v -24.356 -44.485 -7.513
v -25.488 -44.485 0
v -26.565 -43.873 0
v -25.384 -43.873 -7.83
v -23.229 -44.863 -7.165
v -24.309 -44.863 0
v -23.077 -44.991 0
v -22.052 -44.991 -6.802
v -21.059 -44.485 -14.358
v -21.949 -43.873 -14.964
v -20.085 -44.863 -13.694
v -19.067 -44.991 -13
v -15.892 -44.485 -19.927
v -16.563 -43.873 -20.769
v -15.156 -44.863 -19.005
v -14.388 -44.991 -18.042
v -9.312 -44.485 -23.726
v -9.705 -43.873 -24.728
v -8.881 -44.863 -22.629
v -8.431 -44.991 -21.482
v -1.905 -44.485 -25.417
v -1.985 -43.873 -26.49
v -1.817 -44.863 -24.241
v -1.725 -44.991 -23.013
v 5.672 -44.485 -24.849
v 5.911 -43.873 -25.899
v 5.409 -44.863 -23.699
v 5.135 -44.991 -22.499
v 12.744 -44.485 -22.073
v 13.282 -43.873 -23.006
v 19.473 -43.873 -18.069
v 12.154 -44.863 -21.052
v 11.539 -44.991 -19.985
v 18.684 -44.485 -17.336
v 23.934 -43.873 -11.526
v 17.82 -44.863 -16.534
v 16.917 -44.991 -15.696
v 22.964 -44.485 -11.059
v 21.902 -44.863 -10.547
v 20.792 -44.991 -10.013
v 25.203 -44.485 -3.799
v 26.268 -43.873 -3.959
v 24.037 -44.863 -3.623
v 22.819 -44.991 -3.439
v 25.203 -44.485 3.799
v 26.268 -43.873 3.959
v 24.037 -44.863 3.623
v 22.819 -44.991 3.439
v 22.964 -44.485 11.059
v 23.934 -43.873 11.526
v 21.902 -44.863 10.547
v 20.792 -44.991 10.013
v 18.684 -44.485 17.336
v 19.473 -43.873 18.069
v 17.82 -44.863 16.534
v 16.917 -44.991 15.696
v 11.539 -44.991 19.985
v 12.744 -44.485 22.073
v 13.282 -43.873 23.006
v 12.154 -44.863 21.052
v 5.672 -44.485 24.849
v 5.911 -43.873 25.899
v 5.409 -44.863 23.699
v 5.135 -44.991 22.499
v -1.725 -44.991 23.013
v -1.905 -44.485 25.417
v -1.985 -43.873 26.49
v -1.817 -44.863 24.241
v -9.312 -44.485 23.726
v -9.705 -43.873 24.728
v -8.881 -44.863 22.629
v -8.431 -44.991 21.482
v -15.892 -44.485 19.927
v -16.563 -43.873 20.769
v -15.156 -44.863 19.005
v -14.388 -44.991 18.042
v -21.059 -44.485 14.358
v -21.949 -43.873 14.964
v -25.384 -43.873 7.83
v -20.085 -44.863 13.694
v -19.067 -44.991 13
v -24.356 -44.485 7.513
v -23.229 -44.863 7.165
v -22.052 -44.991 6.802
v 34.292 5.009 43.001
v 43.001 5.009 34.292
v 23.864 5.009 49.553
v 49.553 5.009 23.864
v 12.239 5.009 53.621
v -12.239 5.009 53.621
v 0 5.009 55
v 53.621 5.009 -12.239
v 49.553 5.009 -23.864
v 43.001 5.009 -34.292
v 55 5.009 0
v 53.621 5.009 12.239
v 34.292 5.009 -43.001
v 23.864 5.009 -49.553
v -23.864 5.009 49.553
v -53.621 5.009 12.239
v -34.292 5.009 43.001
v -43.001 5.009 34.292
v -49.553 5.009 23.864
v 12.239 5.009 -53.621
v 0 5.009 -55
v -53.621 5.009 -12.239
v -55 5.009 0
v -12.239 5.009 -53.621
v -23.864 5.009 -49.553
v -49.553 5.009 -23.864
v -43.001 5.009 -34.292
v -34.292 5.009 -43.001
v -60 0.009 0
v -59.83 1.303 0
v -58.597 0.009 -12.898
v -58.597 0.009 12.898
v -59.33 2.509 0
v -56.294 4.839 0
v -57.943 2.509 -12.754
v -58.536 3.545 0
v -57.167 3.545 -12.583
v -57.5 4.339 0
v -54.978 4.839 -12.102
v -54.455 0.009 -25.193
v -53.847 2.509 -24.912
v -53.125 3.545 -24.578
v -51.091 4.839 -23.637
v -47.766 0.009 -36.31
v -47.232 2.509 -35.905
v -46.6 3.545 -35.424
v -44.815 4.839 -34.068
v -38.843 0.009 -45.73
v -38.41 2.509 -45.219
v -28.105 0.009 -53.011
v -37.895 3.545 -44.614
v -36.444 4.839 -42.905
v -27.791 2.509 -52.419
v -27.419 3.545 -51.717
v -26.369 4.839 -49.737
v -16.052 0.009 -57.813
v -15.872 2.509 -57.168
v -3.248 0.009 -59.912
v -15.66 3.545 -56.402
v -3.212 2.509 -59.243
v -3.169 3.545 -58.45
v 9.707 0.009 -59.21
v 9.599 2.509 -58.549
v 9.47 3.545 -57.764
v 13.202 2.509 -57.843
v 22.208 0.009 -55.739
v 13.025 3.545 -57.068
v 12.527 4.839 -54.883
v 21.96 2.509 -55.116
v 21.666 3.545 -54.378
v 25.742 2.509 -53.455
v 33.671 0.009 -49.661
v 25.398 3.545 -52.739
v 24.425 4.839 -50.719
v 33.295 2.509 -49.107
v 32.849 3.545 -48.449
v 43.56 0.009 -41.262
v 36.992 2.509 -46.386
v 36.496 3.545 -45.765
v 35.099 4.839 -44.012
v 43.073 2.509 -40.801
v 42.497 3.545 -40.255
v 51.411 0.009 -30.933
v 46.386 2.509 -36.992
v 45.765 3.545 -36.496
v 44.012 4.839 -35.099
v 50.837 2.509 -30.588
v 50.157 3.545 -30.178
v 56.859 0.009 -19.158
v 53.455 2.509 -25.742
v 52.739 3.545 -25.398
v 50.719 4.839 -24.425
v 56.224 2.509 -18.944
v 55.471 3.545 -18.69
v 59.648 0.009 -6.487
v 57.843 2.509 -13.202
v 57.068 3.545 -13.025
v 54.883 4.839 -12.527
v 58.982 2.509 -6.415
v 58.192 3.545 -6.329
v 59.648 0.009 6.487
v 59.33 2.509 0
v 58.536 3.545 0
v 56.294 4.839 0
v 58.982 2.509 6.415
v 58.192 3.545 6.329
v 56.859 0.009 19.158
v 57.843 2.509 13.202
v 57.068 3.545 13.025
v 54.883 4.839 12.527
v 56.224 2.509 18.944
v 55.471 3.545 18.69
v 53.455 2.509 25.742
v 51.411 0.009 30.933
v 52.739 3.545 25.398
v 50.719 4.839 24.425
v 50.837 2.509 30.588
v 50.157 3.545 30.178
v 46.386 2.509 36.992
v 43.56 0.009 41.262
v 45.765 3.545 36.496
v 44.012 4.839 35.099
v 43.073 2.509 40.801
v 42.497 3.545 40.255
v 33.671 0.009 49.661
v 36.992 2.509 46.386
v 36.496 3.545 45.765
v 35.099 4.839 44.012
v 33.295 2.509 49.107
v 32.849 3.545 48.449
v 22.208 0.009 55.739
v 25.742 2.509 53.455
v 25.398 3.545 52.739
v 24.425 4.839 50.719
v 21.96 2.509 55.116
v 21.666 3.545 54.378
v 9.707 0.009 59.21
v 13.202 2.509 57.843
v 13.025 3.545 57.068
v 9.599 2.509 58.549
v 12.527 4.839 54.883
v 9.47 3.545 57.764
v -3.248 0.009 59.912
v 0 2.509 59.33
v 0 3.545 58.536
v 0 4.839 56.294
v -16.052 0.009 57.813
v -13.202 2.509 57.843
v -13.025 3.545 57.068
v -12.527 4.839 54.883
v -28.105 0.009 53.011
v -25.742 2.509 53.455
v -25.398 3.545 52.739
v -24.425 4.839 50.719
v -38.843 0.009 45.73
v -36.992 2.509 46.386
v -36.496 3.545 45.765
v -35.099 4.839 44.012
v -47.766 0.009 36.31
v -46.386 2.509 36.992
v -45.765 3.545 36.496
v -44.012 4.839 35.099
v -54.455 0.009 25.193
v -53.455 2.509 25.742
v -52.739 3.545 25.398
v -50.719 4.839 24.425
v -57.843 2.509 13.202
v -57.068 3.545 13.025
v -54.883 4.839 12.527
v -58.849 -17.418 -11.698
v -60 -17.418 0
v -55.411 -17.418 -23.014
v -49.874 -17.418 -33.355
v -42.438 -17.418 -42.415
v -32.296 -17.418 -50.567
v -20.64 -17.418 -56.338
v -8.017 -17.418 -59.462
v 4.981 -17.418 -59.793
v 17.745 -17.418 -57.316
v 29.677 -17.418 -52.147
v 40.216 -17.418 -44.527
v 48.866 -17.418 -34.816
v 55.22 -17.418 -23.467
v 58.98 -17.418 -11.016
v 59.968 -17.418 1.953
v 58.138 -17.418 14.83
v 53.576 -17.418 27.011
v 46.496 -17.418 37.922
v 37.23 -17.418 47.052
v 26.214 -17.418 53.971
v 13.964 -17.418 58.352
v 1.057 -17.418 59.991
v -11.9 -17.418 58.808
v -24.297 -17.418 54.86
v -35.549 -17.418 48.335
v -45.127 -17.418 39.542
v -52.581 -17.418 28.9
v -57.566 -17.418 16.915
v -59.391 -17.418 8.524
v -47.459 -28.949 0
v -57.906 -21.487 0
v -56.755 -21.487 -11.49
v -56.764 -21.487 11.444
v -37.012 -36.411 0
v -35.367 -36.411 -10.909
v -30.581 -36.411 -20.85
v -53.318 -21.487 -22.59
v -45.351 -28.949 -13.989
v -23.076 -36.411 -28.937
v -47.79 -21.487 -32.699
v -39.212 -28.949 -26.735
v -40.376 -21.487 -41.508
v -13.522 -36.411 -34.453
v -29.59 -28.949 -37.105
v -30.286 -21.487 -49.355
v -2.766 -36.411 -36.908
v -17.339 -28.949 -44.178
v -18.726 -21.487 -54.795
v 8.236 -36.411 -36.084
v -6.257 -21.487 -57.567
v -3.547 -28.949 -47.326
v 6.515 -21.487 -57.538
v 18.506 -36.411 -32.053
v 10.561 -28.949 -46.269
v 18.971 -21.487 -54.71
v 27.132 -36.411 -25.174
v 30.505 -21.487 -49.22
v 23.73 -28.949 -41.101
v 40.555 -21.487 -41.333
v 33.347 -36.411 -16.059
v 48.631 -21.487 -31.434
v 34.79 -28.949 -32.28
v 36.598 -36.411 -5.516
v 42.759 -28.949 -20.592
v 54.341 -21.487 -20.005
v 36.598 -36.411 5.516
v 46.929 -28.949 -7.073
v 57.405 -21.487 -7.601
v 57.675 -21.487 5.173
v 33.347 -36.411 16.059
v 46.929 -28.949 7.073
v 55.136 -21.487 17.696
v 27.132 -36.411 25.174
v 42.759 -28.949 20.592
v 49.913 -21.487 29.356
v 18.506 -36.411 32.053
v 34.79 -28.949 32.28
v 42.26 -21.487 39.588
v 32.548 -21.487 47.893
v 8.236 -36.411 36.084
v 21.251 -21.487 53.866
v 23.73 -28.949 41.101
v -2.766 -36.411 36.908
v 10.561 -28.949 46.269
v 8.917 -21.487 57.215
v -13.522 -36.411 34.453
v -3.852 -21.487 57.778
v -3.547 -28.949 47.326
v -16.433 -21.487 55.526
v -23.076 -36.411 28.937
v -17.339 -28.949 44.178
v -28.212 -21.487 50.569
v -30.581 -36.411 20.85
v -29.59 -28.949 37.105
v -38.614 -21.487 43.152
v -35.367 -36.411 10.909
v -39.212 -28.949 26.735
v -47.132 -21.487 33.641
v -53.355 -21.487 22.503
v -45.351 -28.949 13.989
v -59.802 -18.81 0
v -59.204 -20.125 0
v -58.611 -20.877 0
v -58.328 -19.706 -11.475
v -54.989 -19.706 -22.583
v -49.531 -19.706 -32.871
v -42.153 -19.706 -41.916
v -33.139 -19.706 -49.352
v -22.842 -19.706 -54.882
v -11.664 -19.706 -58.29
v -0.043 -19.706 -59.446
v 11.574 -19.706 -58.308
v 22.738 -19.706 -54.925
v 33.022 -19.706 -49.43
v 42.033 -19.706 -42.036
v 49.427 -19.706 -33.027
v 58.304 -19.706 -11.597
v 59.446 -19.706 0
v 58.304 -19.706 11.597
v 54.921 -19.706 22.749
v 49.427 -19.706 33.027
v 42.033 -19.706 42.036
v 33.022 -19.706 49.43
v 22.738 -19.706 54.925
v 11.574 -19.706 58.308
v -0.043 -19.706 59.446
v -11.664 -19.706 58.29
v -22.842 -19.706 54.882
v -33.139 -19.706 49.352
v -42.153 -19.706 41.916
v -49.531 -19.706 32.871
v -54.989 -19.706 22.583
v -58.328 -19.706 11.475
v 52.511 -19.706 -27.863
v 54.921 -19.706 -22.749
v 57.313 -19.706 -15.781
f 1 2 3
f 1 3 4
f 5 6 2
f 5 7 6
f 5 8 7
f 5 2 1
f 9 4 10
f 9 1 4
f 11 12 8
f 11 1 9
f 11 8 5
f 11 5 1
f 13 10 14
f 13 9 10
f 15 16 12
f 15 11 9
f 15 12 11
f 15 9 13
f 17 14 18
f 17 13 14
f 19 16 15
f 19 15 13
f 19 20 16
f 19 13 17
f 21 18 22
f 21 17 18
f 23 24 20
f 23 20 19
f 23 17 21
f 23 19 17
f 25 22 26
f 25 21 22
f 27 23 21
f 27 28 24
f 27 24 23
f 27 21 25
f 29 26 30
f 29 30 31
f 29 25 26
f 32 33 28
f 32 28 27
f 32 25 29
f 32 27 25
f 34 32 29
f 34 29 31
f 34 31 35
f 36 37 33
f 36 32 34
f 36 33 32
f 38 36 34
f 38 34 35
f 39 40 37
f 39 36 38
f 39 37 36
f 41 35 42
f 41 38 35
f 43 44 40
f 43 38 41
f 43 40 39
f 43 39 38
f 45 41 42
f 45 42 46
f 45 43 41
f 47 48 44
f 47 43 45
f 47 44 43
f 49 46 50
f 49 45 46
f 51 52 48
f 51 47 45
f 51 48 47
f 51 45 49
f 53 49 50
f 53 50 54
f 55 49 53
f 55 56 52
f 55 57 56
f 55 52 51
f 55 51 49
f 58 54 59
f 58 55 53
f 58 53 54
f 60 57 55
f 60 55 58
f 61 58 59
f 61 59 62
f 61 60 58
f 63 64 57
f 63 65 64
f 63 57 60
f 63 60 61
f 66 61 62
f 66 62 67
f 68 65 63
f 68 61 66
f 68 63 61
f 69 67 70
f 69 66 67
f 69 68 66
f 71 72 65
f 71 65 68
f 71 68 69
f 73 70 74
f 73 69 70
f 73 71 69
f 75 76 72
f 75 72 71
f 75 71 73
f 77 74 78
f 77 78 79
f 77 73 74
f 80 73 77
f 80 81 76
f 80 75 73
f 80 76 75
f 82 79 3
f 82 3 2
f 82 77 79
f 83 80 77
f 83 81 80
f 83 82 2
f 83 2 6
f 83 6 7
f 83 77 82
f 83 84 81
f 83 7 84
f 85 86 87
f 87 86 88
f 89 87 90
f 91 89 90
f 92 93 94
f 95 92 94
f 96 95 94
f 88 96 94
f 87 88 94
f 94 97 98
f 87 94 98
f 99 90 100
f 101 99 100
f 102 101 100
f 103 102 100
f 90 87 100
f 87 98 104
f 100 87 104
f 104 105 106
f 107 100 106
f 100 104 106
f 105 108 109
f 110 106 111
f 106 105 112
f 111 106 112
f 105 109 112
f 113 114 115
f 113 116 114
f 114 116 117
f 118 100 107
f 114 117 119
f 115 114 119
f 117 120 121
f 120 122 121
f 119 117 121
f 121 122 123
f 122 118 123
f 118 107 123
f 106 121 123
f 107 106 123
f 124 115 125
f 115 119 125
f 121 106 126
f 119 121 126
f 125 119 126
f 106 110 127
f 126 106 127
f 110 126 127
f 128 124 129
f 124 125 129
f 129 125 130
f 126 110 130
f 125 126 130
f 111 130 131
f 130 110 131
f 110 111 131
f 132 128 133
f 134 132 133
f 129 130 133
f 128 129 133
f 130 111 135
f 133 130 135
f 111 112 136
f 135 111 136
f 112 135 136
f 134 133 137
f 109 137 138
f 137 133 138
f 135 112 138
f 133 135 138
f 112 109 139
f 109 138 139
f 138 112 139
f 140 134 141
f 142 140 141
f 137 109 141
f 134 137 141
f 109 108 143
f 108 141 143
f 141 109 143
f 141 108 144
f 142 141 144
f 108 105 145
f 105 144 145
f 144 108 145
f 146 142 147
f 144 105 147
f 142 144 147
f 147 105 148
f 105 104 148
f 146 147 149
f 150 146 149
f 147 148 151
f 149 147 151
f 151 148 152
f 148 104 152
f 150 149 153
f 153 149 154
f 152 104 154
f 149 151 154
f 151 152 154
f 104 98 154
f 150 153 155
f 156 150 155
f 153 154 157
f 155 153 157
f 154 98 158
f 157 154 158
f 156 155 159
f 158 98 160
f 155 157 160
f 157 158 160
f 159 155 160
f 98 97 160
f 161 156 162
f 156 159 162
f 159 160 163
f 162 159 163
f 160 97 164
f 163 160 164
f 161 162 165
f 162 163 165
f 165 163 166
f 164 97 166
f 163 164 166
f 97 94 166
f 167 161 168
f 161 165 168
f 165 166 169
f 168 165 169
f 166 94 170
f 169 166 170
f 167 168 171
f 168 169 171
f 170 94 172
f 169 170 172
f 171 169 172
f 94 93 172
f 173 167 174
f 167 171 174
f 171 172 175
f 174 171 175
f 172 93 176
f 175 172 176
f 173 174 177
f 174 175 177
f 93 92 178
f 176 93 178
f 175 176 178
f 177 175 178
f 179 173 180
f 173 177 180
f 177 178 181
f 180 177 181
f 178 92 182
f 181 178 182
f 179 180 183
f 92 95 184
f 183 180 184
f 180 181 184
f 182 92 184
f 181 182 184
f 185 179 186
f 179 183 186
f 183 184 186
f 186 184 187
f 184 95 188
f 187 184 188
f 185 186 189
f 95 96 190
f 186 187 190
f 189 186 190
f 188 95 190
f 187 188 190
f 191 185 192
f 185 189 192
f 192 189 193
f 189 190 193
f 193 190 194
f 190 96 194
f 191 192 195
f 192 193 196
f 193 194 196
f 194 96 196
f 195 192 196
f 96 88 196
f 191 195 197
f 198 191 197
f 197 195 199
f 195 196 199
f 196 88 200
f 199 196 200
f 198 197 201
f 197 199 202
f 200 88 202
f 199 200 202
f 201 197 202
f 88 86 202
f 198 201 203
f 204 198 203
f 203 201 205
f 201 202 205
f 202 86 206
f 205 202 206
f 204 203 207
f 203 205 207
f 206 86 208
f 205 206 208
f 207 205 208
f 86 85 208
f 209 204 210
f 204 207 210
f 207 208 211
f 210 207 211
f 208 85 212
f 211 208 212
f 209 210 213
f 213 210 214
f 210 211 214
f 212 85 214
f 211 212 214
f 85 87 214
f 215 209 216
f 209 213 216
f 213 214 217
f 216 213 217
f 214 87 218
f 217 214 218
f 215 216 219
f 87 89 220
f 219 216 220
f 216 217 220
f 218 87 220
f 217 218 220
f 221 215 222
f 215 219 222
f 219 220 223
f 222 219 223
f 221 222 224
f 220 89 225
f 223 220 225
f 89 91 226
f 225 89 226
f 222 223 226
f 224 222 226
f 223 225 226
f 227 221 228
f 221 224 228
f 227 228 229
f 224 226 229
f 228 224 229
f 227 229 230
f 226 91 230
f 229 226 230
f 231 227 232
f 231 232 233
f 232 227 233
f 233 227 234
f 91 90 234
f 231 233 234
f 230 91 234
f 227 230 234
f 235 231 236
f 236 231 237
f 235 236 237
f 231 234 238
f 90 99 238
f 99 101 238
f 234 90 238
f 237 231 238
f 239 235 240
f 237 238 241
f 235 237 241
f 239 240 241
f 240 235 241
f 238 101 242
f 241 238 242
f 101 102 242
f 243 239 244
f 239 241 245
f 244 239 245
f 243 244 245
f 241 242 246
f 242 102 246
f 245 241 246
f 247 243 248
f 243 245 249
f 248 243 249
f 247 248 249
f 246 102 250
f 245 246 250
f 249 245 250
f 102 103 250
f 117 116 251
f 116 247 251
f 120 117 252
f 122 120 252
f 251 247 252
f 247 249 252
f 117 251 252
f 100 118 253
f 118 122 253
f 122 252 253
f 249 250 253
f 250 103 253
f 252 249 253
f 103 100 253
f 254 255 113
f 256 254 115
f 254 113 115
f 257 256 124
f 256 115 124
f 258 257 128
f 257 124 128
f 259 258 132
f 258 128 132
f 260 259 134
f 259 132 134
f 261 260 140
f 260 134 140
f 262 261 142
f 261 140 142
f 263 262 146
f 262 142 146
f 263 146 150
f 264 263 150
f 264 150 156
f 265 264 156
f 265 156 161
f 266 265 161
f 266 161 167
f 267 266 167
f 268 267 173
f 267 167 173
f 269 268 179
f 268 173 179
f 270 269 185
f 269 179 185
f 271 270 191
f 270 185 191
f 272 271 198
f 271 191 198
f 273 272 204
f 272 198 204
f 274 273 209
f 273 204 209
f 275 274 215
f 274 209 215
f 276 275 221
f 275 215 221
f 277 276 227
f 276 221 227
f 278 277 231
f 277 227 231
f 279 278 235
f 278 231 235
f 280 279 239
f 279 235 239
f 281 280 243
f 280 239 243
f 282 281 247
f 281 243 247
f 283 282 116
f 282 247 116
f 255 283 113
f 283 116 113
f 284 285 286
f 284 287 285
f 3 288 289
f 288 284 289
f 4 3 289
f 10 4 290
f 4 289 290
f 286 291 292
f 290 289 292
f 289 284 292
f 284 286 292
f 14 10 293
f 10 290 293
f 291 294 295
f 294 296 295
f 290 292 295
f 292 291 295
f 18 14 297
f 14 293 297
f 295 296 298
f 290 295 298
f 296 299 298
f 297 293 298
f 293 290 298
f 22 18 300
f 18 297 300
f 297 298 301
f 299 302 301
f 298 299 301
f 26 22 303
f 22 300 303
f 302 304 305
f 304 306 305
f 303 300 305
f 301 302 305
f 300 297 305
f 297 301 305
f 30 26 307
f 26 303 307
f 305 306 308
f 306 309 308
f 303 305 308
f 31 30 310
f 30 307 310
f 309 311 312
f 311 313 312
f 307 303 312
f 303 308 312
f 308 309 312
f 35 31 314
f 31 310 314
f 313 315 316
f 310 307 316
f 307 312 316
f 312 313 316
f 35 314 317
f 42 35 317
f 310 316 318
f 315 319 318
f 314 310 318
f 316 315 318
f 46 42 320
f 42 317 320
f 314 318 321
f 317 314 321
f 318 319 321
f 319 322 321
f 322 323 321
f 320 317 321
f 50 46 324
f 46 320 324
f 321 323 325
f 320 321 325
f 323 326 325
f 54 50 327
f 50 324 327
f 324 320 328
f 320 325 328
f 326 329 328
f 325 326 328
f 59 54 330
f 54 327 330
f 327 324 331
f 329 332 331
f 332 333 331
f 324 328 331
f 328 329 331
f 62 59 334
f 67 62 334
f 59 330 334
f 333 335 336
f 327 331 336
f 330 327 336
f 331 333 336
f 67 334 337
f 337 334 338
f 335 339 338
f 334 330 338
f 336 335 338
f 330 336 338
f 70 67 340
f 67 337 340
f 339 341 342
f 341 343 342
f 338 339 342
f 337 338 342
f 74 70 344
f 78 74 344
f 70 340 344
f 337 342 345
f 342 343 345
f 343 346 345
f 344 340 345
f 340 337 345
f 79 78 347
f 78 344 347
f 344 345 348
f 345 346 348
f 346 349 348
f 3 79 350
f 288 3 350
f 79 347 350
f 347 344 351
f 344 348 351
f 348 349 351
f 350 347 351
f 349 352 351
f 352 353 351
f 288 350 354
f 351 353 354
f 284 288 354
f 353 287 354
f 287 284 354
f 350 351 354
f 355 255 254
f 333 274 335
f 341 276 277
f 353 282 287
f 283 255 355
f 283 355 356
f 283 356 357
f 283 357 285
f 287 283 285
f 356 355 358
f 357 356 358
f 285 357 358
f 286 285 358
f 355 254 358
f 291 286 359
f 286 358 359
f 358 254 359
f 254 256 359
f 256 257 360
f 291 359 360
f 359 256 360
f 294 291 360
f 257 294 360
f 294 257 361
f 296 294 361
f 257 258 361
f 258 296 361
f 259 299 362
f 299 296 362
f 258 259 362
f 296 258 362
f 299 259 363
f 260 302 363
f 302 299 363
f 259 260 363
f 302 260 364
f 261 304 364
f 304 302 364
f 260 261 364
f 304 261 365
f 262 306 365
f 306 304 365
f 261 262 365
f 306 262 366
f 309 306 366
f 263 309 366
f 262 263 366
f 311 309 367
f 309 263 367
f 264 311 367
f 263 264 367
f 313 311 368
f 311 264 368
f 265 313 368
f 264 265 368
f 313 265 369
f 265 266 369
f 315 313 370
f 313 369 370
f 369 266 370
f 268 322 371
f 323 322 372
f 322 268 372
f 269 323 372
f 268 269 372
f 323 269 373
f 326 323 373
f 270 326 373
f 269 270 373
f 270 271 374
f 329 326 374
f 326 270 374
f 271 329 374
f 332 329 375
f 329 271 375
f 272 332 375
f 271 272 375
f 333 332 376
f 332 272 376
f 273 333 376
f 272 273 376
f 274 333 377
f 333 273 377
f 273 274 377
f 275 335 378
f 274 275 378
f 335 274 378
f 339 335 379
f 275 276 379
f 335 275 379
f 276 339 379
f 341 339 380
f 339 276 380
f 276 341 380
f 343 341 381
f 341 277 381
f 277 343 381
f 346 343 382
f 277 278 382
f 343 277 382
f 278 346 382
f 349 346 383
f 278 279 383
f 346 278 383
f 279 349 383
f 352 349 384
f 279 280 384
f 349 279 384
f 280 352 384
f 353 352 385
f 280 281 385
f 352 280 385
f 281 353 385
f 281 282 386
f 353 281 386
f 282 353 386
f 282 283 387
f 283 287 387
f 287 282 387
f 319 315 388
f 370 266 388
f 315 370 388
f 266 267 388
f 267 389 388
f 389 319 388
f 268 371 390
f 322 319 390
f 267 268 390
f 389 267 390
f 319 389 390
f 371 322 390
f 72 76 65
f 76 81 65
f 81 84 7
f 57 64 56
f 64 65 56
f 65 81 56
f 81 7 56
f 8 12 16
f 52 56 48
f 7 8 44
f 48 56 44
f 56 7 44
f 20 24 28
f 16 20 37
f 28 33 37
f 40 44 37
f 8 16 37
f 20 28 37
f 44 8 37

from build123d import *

# Parameters (mm, degrees)
FILLET2_R = 5
FILLET3_R = 5
FILLET4_R = 6


with BuildPart() as part:
    # Sketch1 → Revolve3 (revolve)
    with BuildSketch(Plane.XY, mode=Mode.PRIVATE) as revolve3_sk:
        Polygon((0, -44.99102057), (25, -44.99102057), (60, -19.99102057), (60, 5.00897943), (0, 5.00897943), align=None)
    revolve(revolve3_sk.sketch.rotate(Axis((0, 5.00897943, 0), (0, -1, 0)), 180), axis=Axis((0, 5.00897943, 0), (0, -1, 0)))

    # Fillet2
    fillet2_edges = [part.edges().sort_by_distance(p)[0] for p in [
        (60, 5.00897943, 0),
    ]]
    fillet(fillet2_edges, radius=FILLET2_R)

    # Fillet3
    fillet3_edges = [part.edges().sort_by_distance(p)[0] for p in [
        (60, -19.99102057, 0),
    ]]
    fillet(fillet3_edges, radius=FILLET3_R)

    # Fillet4
    fillet4_edges = [part.edges().sort_by_distance(p)[0] for p in [
        (25, -44.99102057, 0),
    ]]
    fillet(fillet4_edges, radius=FILLET4_R)


solid = part.part
